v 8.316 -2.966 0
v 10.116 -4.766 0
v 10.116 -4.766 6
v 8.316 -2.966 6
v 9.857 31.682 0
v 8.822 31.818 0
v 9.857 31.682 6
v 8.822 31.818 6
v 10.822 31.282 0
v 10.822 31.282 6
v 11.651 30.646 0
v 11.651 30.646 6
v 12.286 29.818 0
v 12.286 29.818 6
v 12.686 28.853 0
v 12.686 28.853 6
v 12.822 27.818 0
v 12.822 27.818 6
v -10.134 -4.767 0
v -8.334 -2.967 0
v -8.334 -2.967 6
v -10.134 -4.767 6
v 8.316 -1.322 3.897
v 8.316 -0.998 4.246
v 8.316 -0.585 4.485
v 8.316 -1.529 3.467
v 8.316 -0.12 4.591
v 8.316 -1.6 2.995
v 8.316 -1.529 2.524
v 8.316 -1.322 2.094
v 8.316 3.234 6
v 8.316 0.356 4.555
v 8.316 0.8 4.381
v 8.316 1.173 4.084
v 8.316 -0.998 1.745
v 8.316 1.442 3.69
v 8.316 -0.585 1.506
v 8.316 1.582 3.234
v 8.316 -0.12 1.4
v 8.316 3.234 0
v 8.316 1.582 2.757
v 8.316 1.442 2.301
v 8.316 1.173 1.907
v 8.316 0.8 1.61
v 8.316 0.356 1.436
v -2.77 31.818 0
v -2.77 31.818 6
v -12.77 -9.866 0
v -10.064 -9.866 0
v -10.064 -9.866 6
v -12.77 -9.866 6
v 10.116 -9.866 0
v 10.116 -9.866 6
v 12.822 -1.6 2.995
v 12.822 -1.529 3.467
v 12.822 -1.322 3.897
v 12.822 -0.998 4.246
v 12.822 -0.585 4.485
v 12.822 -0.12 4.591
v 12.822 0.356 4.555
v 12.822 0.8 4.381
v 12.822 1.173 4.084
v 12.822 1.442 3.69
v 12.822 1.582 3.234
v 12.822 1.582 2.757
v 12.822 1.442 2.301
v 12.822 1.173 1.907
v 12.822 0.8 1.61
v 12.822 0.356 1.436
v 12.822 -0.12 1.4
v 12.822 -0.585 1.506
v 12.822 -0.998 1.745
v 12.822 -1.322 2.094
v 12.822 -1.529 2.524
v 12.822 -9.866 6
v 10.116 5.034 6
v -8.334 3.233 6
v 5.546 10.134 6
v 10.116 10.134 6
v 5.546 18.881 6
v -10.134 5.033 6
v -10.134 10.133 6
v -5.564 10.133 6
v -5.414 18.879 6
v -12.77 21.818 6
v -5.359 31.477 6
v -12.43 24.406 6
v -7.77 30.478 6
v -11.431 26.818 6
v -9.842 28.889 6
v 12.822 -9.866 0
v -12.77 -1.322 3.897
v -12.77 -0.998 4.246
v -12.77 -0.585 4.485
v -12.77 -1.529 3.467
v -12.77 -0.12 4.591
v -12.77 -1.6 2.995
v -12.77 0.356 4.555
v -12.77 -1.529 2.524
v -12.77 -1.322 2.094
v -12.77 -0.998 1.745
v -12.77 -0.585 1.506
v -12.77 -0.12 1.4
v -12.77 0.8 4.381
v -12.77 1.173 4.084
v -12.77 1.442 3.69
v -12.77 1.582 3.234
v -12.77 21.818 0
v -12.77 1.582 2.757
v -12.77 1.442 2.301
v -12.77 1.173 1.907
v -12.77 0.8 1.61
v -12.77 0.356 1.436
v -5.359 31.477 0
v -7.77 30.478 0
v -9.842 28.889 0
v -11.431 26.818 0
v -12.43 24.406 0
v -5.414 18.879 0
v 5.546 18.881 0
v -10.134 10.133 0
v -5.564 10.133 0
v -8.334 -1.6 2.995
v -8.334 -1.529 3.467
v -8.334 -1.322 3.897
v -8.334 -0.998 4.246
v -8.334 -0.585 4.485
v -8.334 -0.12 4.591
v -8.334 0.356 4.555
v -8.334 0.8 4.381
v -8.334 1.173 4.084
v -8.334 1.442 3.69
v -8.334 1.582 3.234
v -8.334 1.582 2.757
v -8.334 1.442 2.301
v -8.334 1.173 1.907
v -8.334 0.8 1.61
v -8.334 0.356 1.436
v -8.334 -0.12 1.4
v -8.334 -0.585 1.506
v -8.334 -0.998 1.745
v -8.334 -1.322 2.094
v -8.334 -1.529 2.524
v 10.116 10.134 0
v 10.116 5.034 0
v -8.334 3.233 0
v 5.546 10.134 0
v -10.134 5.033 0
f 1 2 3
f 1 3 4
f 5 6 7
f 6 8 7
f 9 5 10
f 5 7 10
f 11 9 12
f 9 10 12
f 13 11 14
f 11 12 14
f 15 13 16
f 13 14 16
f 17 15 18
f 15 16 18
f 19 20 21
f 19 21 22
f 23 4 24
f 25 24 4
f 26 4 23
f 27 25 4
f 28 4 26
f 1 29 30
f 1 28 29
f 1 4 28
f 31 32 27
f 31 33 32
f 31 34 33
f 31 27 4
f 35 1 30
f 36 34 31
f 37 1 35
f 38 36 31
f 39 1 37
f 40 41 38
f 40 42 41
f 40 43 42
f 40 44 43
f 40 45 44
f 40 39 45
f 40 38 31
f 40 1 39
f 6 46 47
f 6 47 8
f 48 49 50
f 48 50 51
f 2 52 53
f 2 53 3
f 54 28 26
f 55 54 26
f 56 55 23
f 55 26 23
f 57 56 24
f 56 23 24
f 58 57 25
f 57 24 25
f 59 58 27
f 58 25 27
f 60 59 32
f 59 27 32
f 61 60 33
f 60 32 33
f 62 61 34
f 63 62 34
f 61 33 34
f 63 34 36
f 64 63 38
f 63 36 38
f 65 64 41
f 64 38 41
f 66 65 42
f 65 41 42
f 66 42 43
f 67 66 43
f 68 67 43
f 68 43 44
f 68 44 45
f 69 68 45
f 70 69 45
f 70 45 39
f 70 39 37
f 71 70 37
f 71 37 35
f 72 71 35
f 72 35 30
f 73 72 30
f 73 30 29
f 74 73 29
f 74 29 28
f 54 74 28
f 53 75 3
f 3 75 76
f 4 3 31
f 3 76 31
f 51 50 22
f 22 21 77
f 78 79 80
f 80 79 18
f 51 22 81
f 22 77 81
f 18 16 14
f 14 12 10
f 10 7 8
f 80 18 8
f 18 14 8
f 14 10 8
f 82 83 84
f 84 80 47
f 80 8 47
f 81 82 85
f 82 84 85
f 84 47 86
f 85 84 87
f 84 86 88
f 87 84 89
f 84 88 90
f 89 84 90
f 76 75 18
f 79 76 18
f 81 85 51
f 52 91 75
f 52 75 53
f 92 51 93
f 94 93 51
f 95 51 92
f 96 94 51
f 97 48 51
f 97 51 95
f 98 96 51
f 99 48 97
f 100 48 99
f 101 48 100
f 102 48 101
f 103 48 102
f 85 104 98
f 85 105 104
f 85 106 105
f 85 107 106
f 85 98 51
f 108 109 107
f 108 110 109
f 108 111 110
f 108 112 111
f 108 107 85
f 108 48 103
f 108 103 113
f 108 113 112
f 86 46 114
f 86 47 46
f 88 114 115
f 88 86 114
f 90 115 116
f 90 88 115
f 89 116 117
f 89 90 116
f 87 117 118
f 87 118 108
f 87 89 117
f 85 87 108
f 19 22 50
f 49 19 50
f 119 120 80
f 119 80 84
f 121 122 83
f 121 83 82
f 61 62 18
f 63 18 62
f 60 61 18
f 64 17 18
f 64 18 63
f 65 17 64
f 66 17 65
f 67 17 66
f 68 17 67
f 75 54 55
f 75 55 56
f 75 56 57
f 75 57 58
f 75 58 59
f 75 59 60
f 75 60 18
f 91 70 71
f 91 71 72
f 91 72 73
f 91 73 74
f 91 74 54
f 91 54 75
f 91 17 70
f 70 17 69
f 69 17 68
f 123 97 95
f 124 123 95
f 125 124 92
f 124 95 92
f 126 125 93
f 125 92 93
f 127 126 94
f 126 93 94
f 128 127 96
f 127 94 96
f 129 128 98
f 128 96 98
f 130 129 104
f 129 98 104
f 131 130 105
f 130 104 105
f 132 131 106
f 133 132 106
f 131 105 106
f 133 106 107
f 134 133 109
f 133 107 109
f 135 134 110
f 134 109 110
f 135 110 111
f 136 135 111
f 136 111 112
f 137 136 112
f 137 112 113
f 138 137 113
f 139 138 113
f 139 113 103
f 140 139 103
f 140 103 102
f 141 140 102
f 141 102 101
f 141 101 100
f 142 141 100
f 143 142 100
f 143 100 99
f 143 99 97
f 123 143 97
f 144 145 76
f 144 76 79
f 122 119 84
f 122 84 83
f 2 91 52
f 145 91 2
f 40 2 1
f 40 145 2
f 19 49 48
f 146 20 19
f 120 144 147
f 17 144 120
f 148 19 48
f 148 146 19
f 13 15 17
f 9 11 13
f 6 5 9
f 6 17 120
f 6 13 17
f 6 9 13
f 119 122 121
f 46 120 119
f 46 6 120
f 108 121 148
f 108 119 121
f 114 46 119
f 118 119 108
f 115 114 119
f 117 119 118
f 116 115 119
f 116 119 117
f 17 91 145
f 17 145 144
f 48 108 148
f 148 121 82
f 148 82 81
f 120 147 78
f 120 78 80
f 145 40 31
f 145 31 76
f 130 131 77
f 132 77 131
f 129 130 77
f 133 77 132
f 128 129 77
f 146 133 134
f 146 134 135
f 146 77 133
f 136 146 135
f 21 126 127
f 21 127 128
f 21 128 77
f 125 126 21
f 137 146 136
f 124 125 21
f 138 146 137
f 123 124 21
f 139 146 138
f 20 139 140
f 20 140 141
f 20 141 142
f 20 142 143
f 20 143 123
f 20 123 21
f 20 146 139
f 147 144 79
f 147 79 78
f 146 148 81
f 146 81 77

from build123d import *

# Parameters (mm, degrees)
PAD016_DEPTH    = 6
FILLET003_R     = 4
FILLET004_R     = 10
SKETCH047_R     = 1.6
POCKET022_DEPTH = 40


with BuildPart() as part:
    # Sketch046 → Pad016 (new body)
    with BuildSketch(Plane.XY):
        Polygon((10.115871, -9.866412), (10.115871, -4.766412), (8.315871, -2.966412), (8.315871, 3.233588), (10.115871, 5.033588), (10.115871, 10.133588), (5.545871, 10.133588), (5.545871, 18.880948), (-5.414129, 18.879181), (-5.564129, 10.133108), (-10.134129, 10.133108), (-10.134129, 5.033108), (-8.334129, 3.233108), (-8.334129, -2.966892), (-10.134129, -4.766892), (-10.064129, -9.866412), (-12.770461, -9.866412), (-12.770461, 31.817863), (12.822202, 31.817863), (12.822202, -9.866412), align=None)
    extrude(amount=PAD016_DEPTH)

    # Fillet003
    fillet003_edges = [part.edges().sort_by_distance(p)[0] for p in [
        (12.822202, 31.817863, 3),
    ]]
    fillet(fillet003_edges, radius=FILLET003_R)

    # Fillet004
    fillet004_edges = [part.edges().sort_by_distance(p)[0] for p in [
        (-12.770461, 31.817863, 3),
    ]]
    fillet(fillet004_edges, radius=FILLET004_R)

    # Sketch047 (on Face6 of Fillet004) → Pocket022 (cut)
    with BuildSketch(Plane(origin=(-12.770461, 0, 0), x_dir=(0, -1, 0), z_dir=(-1, 0, 0))):
        with Locations((0, 2.995476)):
            Circle(SKETCH047_R)
    extrude(amount=-POCKET022_DEPTH, mode=Mode.SUBTRACT)


solid = part.part
